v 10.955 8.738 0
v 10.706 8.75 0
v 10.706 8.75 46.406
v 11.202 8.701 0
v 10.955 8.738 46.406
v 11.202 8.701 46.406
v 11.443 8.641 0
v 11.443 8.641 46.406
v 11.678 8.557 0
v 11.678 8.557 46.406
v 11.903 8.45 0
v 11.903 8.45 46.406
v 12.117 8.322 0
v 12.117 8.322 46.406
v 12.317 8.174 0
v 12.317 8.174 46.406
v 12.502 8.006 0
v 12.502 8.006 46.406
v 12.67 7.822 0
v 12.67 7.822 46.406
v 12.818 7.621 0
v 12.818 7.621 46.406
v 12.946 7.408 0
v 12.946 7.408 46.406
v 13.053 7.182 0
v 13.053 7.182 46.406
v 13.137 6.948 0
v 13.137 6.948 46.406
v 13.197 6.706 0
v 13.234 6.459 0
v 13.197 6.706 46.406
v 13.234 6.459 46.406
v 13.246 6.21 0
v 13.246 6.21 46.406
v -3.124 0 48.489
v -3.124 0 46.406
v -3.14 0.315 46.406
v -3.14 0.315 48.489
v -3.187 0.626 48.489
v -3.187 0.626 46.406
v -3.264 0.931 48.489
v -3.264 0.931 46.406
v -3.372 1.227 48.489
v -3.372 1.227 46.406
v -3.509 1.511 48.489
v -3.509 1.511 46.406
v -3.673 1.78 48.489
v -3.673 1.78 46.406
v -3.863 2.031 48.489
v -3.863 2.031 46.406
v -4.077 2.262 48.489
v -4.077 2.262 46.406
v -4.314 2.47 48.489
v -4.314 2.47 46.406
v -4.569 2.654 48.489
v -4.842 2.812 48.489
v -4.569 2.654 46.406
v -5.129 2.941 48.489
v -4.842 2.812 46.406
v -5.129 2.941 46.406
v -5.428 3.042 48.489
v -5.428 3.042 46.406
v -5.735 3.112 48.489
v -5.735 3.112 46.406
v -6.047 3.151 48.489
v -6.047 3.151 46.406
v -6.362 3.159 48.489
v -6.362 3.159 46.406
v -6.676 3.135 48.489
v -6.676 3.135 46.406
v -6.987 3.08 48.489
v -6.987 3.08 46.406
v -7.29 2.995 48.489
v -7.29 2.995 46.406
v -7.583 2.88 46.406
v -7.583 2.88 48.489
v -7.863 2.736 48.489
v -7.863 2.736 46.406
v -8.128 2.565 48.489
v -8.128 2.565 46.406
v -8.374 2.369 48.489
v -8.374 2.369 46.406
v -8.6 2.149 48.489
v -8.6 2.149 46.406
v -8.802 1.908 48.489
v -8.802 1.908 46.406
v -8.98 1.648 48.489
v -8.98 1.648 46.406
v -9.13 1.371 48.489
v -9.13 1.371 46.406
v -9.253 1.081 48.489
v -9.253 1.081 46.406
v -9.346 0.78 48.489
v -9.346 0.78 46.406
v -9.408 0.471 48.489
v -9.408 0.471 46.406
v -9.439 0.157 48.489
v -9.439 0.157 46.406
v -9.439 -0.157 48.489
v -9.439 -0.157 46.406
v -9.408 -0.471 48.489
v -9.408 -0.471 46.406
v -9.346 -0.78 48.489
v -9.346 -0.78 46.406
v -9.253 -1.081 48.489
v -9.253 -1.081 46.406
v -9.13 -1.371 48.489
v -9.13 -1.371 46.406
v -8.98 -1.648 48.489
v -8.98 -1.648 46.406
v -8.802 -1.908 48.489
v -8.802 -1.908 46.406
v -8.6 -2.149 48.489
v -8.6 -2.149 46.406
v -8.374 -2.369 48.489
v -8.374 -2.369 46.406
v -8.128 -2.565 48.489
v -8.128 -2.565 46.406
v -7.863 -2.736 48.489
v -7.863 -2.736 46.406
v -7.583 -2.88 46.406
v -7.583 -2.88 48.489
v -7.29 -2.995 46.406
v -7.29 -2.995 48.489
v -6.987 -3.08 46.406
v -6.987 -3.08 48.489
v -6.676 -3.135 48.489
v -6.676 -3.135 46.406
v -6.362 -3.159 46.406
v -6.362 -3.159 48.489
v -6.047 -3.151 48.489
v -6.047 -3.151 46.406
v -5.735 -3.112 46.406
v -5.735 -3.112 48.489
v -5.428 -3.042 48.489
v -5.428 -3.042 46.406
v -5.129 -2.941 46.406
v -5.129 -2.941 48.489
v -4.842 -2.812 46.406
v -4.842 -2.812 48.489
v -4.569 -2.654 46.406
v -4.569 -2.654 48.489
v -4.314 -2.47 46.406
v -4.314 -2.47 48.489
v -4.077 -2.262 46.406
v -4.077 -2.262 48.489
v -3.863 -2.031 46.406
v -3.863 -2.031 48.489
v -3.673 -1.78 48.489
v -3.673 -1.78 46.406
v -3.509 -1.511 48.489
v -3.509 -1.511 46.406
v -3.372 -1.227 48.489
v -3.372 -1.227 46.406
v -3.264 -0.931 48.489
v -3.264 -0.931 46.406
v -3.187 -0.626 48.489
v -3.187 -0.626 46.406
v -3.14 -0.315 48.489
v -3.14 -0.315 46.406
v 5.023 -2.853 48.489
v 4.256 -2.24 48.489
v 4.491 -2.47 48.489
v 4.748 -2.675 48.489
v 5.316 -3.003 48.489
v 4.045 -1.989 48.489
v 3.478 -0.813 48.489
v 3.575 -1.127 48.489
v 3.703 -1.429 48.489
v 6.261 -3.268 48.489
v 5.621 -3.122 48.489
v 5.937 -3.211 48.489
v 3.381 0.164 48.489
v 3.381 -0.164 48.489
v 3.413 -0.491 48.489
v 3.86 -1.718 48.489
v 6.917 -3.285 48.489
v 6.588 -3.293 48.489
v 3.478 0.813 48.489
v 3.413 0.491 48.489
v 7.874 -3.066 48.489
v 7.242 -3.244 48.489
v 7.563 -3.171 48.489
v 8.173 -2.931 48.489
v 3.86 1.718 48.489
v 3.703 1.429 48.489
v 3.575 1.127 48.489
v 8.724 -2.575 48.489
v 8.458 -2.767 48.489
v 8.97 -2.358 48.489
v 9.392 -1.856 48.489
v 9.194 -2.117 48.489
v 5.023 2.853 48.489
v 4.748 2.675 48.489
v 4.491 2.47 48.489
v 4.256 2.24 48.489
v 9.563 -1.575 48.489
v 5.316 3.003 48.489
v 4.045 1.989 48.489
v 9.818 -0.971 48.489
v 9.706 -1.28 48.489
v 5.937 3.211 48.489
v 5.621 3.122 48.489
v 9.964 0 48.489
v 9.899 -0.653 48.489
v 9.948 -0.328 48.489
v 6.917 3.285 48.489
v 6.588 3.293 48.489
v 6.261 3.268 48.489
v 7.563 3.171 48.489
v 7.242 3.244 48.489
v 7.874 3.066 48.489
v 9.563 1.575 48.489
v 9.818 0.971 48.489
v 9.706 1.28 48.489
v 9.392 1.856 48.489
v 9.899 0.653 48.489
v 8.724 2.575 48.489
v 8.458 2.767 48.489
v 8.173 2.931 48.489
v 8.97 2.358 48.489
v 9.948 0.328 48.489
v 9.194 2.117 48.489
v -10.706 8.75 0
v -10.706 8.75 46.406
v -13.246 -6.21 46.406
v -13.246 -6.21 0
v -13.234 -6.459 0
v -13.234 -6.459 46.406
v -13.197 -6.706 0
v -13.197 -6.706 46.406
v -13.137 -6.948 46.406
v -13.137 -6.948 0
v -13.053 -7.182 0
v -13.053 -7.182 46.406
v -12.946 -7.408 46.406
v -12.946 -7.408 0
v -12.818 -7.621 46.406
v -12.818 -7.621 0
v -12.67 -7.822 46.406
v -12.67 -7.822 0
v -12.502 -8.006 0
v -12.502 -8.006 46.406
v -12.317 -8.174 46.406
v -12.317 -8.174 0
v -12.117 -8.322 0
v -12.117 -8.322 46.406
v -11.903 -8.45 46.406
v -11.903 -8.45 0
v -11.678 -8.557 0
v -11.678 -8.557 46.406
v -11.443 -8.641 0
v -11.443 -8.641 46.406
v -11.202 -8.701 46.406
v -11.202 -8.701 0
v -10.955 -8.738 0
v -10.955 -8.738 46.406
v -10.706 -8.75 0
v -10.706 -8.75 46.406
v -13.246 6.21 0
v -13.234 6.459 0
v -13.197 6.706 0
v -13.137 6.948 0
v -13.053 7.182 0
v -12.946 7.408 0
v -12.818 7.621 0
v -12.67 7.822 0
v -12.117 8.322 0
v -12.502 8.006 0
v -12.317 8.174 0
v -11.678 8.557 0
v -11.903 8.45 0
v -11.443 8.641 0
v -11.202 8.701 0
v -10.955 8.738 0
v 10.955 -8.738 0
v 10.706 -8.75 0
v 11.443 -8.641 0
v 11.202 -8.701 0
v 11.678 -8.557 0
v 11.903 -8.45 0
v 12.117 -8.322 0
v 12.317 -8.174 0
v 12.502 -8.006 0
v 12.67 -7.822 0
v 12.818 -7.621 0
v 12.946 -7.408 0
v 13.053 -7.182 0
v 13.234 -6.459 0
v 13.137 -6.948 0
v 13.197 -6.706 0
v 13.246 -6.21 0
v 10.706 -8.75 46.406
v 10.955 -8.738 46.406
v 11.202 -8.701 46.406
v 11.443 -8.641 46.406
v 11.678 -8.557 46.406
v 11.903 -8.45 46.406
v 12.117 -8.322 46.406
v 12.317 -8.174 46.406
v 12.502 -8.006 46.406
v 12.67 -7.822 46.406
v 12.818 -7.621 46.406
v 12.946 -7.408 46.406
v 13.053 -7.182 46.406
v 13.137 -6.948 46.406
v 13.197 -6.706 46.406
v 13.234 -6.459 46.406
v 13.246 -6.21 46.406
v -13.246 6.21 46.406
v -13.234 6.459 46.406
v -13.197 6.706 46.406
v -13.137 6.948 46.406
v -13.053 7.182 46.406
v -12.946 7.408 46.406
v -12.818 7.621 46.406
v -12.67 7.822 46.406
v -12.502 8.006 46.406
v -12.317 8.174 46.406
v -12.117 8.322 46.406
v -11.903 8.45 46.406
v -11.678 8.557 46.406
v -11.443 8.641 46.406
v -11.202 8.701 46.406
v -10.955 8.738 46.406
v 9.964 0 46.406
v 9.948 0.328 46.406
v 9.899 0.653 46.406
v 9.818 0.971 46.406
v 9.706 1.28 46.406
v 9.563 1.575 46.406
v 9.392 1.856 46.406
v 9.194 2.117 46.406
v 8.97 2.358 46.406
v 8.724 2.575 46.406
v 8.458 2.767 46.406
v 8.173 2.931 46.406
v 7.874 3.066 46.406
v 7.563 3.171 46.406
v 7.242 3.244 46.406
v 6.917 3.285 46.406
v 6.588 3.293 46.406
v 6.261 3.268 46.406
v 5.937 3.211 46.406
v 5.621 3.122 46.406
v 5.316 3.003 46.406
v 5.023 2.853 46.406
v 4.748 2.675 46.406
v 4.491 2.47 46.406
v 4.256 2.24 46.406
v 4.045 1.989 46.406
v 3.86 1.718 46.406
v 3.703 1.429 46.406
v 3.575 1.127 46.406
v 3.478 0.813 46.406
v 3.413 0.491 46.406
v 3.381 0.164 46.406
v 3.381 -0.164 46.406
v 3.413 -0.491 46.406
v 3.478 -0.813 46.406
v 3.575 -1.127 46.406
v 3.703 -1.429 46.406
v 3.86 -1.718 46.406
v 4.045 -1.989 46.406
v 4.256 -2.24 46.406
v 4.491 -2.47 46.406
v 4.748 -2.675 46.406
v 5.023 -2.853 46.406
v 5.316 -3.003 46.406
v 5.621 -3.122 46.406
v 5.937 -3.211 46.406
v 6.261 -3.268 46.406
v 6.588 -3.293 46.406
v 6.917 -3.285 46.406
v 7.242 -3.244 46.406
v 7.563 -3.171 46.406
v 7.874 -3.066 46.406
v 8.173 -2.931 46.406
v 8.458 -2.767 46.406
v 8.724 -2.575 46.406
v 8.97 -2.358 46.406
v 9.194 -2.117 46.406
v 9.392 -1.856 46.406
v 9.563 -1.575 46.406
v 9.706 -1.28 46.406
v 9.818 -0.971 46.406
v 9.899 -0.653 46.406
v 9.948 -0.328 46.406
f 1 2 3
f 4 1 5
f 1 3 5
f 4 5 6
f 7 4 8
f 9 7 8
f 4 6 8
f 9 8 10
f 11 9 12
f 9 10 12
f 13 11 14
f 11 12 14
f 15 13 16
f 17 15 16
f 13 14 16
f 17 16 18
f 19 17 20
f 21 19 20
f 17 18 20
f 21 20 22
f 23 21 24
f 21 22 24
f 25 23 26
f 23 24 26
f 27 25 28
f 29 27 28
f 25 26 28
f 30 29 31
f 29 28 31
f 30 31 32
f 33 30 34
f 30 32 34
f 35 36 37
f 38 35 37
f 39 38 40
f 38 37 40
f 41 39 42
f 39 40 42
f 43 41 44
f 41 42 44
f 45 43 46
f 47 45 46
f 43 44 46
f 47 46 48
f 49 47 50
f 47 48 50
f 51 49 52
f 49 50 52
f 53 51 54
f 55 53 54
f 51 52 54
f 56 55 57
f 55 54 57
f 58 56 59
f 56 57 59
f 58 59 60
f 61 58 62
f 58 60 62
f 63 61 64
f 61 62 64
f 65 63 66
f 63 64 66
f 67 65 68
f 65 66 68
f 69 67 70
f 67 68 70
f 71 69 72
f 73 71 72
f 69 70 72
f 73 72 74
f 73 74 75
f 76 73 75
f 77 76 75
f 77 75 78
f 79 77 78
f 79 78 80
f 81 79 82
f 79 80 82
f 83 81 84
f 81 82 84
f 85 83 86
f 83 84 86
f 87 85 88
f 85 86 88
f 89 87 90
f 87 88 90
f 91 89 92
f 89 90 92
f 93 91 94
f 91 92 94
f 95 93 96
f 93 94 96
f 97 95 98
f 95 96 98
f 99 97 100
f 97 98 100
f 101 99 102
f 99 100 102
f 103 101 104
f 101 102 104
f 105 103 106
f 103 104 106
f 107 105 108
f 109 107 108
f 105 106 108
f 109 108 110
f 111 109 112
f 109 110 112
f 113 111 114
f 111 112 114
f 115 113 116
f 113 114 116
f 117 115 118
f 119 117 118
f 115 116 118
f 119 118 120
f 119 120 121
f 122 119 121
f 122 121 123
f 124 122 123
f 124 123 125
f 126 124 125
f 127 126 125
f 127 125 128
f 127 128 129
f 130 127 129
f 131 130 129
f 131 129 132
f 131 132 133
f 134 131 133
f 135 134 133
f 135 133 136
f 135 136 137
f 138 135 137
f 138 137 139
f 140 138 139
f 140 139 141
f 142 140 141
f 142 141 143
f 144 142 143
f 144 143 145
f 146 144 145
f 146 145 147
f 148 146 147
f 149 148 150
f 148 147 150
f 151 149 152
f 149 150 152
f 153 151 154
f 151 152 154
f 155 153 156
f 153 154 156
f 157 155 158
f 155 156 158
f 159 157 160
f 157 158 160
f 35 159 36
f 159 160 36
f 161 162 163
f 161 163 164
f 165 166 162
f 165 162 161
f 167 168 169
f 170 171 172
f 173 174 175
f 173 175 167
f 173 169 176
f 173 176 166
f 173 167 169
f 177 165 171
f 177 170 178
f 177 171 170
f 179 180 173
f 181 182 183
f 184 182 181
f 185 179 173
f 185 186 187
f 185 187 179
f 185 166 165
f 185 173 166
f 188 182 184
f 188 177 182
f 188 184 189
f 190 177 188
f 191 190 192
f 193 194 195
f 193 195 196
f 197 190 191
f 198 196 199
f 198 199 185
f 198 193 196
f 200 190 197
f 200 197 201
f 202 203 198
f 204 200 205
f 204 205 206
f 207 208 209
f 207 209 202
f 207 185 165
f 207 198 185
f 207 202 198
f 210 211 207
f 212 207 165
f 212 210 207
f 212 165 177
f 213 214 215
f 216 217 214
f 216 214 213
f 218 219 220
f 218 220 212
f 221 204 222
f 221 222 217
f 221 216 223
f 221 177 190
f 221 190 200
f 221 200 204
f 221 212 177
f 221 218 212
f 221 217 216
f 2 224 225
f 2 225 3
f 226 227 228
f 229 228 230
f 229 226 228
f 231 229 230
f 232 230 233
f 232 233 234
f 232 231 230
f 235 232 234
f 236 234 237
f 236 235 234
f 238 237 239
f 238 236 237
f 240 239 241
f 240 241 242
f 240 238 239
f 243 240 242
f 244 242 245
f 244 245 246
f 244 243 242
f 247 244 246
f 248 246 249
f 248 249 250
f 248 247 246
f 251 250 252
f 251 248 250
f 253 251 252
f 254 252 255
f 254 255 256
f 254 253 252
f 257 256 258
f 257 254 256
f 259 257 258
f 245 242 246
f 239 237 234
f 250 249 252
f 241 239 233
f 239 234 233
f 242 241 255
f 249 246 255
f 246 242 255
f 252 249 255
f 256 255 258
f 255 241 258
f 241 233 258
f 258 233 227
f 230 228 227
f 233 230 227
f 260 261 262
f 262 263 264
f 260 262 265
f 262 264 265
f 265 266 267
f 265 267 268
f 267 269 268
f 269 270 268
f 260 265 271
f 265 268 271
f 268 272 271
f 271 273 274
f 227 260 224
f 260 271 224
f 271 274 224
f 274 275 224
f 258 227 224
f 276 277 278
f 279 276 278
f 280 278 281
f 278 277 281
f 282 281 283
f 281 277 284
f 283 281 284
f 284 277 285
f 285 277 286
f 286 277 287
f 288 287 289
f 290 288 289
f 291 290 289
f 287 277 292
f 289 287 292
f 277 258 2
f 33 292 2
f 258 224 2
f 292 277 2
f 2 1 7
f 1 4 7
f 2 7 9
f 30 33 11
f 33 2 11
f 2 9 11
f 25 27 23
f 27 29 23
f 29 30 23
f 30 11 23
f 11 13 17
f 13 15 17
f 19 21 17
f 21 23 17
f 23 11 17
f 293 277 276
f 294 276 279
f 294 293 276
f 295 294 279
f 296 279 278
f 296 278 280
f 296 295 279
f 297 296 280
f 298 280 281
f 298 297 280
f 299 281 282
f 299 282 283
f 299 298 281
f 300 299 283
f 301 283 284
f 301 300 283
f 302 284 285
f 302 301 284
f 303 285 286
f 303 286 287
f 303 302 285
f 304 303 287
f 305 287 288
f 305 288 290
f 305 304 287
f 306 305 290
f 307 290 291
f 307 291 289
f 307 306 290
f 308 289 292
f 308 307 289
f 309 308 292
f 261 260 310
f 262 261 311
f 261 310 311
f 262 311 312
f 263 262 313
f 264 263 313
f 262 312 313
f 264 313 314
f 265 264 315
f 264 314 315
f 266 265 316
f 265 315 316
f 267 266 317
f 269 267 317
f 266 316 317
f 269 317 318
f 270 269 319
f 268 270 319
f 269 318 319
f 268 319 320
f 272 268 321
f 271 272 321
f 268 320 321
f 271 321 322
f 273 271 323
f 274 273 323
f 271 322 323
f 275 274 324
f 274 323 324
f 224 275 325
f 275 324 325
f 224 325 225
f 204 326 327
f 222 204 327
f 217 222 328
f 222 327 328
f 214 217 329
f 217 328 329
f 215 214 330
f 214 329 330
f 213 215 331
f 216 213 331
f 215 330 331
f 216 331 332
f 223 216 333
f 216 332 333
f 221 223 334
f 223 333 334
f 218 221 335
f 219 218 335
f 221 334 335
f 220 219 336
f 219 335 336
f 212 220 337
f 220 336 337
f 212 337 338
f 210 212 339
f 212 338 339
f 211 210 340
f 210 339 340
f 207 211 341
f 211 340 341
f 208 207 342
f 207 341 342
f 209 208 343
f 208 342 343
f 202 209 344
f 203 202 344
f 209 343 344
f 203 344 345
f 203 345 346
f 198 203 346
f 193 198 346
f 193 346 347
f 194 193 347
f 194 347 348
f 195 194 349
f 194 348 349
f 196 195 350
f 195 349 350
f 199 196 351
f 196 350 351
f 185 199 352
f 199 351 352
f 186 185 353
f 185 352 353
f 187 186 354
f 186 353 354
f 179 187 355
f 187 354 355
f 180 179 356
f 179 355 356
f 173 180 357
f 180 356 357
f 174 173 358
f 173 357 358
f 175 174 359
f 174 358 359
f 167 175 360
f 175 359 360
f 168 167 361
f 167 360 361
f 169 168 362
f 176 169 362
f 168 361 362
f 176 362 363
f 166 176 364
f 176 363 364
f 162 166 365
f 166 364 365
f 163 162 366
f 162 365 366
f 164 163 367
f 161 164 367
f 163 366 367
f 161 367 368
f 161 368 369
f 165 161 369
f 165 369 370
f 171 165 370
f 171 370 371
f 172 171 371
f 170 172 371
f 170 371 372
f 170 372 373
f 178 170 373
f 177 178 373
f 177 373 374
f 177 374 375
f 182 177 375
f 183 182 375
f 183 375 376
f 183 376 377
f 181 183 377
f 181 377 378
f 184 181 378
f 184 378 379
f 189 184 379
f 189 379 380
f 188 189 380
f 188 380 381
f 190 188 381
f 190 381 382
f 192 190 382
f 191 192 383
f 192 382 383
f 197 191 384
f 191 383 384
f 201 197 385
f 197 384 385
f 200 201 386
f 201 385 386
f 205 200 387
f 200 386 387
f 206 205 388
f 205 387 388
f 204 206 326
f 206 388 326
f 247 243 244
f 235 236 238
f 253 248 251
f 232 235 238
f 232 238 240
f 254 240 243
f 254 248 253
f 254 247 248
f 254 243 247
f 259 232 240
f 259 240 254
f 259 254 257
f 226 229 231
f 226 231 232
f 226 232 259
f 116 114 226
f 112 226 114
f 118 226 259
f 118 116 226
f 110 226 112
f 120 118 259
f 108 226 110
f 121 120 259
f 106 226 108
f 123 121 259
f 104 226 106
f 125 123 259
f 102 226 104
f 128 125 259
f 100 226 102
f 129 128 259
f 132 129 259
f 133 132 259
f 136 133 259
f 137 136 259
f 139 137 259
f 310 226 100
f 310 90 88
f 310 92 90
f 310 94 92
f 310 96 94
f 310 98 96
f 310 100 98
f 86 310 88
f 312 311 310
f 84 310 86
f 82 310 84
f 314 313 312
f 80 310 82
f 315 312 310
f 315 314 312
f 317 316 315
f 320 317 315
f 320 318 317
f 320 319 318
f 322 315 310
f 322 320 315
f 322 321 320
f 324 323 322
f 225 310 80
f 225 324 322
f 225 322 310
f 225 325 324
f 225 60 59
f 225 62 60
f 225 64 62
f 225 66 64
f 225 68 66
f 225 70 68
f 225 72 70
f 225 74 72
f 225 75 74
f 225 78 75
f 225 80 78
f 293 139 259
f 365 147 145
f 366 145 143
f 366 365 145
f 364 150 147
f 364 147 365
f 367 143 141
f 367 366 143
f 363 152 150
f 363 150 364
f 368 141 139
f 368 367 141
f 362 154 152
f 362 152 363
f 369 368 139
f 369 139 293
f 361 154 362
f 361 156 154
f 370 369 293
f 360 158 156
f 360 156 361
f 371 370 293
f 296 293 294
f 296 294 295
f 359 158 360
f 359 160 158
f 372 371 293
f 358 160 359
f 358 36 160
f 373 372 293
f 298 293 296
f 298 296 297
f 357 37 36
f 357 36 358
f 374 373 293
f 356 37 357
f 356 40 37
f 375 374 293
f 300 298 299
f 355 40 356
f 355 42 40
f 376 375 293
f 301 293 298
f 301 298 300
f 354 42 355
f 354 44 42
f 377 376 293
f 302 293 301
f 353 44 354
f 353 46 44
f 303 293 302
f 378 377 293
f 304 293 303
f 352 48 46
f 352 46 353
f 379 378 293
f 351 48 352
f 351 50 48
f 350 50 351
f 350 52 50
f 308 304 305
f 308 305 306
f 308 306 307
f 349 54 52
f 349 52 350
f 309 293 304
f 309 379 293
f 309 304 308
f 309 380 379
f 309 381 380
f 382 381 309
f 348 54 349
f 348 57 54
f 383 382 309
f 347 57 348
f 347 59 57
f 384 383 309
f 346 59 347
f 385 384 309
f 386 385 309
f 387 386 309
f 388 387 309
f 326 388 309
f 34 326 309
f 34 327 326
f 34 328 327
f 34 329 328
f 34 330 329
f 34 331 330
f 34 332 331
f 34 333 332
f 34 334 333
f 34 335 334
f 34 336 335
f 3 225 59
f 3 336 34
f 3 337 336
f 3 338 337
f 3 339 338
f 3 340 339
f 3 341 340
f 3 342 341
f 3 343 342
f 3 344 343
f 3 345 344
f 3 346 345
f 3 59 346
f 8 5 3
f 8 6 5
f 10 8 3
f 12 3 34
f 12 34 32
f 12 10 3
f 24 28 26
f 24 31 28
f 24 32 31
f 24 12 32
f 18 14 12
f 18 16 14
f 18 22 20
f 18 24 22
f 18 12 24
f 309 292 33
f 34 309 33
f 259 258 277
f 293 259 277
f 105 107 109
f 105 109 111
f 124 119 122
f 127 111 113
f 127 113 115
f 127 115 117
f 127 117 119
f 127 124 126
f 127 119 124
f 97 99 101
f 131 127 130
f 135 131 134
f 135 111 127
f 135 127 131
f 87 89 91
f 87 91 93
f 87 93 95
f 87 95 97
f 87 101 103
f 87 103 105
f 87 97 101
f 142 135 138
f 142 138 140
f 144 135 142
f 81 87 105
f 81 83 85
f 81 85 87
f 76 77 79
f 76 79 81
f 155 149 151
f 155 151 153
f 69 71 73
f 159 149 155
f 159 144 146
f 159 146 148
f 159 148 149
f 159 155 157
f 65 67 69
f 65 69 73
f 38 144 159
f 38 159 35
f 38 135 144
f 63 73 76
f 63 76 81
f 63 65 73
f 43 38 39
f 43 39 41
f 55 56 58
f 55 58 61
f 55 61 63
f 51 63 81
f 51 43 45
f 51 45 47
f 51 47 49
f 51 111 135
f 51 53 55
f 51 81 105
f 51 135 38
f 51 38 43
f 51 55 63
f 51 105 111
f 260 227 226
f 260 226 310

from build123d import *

# Parameters (mm, degrees)
F0_W     = 26.4922
F0_H     = 17.5006
F1_DEPTH = 46.4058
F2_R     = 3.159655
F2_R_2   = 3.294016
F3_DEPTH = 2.0828
F4_R     = 2.54


with BuildPart() as f1:
    # F0 (on Top) → F1 (new body)
    with BuildSketch(Plane.XY):
        Rectangle(F0_W, F0_H)
    extrude(amount=F1_DEPTH)

    # F2 (on face) → F3 (join)
    with BuildSketch(Plane.XY.offset(46.4058)):
        with Locations((-6.283553, 0)):
            Circle(F2_R)
        with Locations((6.670447, 0)):
            Circle(F2_R_2)
    extrude(amount=F3_DEPTH)

    # F4
    f4_edges = [f1.edges().sort_by_distance(p)[0] for p in [
        (-13.2461, -8.7503, 23.2029),
        (13.2461, -8.7503, 23.2029),
        (13.2461, 8.7503, 23.2029),
        (-13.2461, 8.7503, 23.2029),
    ]]
    fillet(f4_edges, radius=F4_R)


solid = f1.part
